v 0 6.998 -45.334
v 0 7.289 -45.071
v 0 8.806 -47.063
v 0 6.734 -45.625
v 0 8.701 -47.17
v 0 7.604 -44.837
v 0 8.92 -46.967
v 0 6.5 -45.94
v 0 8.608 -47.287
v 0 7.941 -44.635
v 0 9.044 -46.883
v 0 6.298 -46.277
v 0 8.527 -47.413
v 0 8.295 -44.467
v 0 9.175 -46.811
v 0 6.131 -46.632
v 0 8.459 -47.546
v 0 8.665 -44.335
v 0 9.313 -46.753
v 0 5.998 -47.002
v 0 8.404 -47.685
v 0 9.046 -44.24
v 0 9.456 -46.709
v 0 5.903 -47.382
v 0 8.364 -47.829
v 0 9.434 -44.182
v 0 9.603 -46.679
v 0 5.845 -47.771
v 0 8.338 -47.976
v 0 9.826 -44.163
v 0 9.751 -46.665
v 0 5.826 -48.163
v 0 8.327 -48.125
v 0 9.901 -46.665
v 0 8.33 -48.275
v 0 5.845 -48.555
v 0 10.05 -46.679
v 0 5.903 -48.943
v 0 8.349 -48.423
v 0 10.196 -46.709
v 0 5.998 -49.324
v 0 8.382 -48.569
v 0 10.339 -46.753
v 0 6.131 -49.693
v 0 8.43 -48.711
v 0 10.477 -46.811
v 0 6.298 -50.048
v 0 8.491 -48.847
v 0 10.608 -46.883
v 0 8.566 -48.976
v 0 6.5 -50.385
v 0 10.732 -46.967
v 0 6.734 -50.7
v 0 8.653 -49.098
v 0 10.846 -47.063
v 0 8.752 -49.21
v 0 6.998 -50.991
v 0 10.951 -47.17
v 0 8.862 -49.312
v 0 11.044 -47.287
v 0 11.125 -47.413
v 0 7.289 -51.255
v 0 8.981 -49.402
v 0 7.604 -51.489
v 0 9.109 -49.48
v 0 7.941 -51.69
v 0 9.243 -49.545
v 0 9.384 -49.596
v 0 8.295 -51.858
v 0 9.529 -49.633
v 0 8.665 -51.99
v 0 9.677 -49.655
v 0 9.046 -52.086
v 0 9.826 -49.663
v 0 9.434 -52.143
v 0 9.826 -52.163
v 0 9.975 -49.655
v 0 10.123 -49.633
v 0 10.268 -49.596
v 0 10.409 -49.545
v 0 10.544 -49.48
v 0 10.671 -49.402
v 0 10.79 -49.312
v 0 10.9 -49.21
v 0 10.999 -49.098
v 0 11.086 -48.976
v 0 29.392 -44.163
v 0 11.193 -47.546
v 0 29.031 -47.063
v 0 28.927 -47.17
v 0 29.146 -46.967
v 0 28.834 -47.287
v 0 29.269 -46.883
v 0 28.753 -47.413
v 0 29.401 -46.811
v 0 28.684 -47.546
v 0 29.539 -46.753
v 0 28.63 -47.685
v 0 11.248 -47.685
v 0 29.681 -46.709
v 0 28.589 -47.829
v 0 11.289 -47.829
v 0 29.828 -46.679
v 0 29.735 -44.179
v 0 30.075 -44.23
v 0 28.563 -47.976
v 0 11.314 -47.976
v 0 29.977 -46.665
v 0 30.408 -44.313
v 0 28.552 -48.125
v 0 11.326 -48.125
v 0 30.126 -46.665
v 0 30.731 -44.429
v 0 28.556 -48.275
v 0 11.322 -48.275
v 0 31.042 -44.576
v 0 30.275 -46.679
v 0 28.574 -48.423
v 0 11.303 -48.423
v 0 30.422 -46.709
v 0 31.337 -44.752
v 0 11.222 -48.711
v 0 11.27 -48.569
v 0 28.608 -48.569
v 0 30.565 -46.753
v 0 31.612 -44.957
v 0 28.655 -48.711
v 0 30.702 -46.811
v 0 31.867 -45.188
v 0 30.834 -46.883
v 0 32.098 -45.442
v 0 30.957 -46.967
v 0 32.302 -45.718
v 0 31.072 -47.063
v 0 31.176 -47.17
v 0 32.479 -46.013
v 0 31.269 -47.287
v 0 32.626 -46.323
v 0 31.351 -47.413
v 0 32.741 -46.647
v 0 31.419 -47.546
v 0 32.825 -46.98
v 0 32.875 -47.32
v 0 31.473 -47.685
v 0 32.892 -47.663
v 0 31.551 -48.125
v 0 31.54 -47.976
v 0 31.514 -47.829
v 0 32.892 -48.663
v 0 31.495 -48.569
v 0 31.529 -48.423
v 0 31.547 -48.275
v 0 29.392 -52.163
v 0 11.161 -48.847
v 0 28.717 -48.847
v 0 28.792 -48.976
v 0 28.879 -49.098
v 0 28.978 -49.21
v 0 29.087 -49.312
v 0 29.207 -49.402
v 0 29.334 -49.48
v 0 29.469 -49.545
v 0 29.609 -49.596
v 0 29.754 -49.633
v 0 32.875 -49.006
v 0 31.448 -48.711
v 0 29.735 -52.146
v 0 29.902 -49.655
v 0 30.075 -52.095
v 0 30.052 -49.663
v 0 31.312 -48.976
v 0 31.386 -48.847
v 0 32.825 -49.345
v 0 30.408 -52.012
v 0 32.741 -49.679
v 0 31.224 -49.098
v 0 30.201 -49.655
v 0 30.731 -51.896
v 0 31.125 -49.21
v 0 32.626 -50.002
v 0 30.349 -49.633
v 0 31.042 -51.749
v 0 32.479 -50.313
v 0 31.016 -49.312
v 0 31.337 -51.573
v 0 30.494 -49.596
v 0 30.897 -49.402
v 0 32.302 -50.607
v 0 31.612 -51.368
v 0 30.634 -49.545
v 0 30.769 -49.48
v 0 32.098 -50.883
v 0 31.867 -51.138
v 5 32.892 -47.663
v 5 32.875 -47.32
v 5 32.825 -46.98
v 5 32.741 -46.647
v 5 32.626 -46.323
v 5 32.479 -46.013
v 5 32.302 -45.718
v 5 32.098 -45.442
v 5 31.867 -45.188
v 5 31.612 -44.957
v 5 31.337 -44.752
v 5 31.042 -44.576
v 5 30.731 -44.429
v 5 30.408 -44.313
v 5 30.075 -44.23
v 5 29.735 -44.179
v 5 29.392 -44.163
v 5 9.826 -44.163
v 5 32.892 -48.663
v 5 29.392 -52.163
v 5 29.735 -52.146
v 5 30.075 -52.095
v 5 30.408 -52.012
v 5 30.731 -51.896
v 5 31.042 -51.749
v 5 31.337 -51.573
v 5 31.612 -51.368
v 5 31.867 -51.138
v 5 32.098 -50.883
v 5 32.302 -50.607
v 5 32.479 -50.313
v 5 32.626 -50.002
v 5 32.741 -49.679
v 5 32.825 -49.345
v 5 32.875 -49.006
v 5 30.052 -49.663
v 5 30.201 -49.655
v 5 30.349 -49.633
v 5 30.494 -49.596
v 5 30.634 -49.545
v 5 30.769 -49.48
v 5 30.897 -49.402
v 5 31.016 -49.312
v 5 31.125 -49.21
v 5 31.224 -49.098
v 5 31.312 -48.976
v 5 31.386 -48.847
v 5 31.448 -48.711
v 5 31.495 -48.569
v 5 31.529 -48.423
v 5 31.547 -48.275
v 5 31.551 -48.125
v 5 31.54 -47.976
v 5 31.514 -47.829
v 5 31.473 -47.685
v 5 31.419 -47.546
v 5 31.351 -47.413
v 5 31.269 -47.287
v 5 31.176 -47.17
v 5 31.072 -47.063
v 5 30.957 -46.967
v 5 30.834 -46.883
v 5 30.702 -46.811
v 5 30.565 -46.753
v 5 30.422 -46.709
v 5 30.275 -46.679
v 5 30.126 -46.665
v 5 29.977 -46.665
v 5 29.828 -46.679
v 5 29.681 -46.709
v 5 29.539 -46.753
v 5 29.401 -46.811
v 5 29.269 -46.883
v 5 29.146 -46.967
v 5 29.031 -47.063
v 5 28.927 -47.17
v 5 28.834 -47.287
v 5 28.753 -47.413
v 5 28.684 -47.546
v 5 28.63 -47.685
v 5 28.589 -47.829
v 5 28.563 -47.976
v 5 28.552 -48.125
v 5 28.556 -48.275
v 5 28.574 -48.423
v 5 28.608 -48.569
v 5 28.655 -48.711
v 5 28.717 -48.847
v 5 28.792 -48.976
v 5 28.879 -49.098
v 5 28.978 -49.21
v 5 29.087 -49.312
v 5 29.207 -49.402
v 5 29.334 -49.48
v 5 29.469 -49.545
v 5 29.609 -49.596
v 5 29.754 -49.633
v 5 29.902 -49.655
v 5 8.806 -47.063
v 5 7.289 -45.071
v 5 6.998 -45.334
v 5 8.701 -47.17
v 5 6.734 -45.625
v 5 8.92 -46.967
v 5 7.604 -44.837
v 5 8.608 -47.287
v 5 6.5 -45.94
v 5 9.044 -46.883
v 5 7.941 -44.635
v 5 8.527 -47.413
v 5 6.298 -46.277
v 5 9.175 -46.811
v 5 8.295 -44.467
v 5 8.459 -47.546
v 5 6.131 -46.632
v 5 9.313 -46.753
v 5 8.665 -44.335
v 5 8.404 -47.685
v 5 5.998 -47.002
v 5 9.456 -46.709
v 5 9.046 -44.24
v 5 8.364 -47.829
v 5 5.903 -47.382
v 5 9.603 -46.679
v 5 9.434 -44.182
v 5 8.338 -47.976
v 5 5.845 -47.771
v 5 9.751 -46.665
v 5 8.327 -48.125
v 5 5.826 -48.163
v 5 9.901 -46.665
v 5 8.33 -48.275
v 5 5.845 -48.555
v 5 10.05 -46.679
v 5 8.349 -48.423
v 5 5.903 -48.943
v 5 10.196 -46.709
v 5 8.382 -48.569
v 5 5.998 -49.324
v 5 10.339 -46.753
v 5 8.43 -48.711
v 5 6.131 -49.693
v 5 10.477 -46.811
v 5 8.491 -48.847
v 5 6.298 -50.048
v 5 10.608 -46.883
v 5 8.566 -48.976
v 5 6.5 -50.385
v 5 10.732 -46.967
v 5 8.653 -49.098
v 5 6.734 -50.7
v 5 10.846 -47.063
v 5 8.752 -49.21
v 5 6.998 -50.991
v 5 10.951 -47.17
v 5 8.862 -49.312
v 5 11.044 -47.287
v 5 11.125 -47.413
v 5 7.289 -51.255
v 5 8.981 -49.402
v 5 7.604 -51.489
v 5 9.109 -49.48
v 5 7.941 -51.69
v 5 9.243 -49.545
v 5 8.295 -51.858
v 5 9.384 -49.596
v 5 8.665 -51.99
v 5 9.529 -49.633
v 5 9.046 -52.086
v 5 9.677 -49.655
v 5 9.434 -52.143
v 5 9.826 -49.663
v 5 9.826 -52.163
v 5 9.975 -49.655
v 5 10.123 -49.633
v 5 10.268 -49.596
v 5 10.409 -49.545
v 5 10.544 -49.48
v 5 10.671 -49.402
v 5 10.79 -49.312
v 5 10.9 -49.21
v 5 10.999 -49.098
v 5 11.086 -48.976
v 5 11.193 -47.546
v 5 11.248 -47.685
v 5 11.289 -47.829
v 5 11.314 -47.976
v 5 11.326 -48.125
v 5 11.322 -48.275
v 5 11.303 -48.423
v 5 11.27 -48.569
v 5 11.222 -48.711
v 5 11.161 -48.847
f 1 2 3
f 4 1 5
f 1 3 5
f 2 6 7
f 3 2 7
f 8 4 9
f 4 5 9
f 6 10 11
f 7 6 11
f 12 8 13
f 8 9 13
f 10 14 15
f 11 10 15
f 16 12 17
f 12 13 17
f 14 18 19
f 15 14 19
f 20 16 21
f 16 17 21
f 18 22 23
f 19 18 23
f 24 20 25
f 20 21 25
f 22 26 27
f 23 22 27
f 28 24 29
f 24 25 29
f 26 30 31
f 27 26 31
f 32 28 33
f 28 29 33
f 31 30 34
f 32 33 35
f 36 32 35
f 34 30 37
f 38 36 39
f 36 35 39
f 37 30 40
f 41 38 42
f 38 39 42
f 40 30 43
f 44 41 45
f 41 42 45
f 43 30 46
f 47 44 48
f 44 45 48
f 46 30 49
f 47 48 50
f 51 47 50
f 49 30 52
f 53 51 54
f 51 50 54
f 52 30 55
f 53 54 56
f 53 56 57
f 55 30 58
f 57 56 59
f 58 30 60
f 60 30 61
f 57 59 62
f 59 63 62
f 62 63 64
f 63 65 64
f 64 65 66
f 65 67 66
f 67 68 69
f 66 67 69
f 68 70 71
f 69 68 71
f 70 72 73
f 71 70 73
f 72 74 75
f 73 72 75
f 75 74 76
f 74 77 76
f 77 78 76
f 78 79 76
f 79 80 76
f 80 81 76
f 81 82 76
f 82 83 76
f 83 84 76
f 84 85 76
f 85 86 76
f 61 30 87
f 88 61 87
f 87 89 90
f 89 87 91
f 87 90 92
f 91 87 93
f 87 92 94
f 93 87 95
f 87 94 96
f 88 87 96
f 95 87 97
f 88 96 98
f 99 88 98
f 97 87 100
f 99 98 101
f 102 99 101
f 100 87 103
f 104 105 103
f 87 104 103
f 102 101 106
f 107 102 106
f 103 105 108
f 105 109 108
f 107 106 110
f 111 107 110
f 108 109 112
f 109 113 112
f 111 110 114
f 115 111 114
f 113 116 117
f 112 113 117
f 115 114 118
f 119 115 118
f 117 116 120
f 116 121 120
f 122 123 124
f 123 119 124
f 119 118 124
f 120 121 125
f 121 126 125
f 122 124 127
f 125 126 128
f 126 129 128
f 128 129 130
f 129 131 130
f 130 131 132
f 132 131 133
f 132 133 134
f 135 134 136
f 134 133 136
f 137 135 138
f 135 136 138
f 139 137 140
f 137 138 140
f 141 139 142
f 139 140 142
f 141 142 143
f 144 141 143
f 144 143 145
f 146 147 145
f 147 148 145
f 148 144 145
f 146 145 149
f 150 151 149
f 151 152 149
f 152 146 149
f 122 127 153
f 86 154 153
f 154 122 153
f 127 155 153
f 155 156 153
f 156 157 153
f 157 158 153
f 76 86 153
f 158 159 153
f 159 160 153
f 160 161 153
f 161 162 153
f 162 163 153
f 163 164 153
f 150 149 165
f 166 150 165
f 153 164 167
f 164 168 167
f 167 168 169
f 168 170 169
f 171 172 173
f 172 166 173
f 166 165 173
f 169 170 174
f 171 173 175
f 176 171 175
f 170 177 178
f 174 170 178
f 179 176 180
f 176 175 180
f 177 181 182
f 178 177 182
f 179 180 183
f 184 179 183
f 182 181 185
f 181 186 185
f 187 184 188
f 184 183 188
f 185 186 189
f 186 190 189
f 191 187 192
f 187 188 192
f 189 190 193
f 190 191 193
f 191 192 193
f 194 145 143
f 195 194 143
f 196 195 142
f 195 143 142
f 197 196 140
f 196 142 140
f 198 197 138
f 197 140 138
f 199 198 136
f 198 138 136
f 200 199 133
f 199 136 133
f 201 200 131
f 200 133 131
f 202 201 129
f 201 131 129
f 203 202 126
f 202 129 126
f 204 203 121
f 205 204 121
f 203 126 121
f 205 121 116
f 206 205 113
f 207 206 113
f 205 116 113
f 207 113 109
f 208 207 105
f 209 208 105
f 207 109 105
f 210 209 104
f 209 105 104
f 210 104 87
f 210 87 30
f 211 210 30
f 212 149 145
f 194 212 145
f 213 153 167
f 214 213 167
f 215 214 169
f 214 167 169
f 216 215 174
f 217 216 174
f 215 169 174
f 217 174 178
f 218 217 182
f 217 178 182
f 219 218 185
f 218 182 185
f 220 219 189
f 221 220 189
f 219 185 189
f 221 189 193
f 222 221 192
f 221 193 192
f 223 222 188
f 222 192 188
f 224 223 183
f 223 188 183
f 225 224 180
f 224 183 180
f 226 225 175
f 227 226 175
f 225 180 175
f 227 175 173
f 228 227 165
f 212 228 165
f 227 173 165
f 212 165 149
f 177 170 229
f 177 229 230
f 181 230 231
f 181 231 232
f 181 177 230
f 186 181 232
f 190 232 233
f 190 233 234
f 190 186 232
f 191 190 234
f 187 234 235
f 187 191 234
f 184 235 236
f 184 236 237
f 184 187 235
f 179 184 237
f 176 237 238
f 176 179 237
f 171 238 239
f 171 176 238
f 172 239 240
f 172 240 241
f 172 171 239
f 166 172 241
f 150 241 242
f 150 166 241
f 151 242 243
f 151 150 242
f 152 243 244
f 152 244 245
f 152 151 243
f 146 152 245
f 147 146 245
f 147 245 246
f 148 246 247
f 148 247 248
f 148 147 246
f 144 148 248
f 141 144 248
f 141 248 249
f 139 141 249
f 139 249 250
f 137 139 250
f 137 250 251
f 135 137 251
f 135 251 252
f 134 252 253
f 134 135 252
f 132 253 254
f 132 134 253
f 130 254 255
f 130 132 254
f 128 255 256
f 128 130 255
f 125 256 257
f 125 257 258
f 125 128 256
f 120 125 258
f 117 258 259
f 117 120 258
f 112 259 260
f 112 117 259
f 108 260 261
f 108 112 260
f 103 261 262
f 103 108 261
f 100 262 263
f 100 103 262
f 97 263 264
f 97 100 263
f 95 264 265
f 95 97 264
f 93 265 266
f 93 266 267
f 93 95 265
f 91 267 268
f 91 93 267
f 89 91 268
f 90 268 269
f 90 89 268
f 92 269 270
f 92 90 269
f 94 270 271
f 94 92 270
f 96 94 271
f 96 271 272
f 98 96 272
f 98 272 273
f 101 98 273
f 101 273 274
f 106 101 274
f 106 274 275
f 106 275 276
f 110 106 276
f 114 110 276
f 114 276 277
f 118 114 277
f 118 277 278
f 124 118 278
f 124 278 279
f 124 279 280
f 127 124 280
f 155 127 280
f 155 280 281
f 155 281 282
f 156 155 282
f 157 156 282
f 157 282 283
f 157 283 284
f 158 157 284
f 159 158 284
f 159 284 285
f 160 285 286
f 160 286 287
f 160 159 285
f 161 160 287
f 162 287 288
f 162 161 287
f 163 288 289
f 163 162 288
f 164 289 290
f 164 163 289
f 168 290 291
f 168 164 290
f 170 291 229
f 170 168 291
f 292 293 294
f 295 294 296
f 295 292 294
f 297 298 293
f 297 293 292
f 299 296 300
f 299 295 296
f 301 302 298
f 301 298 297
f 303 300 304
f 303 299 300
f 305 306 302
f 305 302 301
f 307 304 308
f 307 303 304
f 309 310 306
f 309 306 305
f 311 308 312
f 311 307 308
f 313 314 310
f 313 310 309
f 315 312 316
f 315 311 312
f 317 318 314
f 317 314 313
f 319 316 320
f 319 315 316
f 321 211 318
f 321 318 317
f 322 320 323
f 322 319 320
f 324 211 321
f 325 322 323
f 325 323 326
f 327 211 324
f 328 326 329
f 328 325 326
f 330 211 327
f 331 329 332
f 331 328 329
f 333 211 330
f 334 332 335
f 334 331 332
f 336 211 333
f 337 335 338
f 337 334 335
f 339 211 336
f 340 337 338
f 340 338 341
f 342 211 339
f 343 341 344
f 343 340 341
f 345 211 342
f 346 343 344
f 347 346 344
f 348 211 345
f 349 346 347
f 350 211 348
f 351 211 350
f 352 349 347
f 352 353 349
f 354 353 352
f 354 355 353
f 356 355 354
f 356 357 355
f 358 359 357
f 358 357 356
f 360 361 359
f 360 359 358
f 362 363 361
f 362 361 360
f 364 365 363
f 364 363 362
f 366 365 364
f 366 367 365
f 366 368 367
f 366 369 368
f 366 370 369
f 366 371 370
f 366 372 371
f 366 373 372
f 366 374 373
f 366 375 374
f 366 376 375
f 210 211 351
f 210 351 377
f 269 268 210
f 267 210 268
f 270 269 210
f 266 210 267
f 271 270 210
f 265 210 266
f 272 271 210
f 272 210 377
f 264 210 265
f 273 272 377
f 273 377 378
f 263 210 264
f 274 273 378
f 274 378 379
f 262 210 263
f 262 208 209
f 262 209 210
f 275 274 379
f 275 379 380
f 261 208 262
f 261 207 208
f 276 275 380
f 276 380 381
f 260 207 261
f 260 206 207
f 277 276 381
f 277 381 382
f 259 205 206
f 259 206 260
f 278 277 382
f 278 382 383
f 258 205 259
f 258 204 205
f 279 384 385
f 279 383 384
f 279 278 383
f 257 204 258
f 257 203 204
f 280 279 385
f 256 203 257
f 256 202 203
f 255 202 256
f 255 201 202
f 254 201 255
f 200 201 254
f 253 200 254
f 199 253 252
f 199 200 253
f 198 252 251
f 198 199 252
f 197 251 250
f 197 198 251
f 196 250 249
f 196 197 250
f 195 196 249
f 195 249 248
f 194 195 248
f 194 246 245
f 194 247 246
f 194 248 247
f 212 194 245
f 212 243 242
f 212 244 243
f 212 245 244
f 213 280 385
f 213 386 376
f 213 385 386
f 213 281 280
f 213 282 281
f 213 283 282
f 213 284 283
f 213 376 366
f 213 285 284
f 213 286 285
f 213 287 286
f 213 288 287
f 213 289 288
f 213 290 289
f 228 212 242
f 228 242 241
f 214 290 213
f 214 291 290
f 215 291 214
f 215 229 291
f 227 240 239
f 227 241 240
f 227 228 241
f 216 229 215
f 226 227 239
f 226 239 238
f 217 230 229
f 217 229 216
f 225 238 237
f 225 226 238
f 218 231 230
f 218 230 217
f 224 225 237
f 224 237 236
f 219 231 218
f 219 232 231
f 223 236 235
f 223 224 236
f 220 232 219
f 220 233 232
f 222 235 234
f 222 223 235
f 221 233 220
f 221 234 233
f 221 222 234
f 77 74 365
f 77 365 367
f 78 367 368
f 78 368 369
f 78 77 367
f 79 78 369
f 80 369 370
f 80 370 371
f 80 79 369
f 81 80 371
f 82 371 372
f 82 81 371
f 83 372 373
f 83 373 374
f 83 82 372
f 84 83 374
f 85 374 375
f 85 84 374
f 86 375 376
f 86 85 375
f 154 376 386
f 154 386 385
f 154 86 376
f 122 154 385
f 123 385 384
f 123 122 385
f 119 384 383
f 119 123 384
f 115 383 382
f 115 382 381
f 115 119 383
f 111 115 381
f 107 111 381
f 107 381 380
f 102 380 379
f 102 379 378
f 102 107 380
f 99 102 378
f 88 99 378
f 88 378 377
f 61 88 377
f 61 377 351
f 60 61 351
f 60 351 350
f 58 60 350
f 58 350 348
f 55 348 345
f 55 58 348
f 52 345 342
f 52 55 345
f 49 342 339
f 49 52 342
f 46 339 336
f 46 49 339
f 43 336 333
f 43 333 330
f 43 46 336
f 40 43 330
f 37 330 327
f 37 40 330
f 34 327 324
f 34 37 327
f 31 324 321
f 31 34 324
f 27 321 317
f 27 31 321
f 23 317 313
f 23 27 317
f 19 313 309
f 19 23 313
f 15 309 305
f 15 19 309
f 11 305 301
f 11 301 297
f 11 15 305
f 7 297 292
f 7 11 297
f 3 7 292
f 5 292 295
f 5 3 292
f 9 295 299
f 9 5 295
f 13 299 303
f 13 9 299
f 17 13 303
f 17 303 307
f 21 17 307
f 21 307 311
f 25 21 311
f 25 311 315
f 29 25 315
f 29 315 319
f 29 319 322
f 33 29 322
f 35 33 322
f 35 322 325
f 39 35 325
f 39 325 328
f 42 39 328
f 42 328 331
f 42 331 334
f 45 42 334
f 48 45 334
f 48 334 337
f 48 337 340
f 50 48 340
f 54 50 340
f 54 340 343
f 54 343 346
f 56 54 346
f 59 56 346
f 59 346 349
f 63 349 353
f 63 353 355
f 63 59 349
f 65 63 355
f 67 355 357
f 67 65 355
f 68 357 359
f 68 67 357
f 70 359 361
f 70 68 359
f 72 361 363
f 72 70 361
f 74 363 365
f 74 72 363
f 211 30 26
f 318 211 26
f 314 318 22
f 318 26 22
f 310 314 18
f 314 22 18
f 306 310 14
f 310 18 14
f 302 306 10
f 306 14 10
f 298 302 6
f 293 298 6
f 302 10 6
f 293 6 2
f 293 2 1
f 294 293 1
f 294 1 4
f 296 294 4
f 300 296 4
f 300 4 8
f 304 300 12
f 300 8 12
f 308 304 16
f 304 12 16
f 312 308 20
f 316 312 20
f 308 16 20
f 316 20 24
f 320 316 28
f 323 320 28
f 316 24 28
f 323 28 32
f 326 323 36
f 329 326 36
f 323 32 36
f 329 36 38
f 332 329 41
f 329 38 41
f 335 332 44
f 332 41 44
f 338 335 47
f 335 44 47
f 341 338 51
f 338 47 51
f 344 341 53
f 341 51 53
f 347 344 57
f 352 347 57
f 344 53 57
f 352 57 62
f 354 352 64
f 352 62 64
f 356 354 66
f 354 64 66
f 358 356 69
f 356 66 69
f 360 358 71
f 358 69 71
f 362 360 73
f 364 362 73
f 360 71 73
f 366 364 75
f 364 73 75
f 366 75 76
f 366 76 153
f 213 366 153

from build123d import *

# Parameters (mm, degrees)
SKETCH1_R           = 1.5
BOSS_EXTRUDE1_DEPTH = 5


with BuildPart() as part:
    # Sketch1 → Boss-Extrude1 (new body)
    with BuildSketch(Plane(origin=(0, 0, 0), x_dir=(0, 0, -1), z_dir=(1, 0, 0))):
        with BuildLine():
            Line((44.162641246, 29.392068372), (44.162641246, 9.826128546))
            ThreePointArc((44.162641246, 9.826128546), (48.162641246, 5.826128546), (52.162641246, 9.826128546))
            Line((52.162641246, 9.826128546), (52.162641246, 29.392068372))
            ThreePointArc((52.162641246, 29.392068372), (51.137514981, 31.866942106), (48.662641246, 32.892068372))
            Line((48.662641246, 32.892068372), (47.662641246, 32.892068372))
            ThreePointArc((47.662641246, 32.892068372), (45.187767512, 31.866942106), (44.162641246, 29.392068372))
        make_face()
        with Locations((48.162641246, 30.051539634)):
            Circle(SKETCH1_R, mode=Mode.SUBTRACT)
        with Locations((48.162641246, 9.826128546)):
            Circle(SKETCH1_R, mode=Mode.SUBTRACT)
    extrude(amount=BOSS_EXTRUDE1_DEPTH)


solid = part.part
